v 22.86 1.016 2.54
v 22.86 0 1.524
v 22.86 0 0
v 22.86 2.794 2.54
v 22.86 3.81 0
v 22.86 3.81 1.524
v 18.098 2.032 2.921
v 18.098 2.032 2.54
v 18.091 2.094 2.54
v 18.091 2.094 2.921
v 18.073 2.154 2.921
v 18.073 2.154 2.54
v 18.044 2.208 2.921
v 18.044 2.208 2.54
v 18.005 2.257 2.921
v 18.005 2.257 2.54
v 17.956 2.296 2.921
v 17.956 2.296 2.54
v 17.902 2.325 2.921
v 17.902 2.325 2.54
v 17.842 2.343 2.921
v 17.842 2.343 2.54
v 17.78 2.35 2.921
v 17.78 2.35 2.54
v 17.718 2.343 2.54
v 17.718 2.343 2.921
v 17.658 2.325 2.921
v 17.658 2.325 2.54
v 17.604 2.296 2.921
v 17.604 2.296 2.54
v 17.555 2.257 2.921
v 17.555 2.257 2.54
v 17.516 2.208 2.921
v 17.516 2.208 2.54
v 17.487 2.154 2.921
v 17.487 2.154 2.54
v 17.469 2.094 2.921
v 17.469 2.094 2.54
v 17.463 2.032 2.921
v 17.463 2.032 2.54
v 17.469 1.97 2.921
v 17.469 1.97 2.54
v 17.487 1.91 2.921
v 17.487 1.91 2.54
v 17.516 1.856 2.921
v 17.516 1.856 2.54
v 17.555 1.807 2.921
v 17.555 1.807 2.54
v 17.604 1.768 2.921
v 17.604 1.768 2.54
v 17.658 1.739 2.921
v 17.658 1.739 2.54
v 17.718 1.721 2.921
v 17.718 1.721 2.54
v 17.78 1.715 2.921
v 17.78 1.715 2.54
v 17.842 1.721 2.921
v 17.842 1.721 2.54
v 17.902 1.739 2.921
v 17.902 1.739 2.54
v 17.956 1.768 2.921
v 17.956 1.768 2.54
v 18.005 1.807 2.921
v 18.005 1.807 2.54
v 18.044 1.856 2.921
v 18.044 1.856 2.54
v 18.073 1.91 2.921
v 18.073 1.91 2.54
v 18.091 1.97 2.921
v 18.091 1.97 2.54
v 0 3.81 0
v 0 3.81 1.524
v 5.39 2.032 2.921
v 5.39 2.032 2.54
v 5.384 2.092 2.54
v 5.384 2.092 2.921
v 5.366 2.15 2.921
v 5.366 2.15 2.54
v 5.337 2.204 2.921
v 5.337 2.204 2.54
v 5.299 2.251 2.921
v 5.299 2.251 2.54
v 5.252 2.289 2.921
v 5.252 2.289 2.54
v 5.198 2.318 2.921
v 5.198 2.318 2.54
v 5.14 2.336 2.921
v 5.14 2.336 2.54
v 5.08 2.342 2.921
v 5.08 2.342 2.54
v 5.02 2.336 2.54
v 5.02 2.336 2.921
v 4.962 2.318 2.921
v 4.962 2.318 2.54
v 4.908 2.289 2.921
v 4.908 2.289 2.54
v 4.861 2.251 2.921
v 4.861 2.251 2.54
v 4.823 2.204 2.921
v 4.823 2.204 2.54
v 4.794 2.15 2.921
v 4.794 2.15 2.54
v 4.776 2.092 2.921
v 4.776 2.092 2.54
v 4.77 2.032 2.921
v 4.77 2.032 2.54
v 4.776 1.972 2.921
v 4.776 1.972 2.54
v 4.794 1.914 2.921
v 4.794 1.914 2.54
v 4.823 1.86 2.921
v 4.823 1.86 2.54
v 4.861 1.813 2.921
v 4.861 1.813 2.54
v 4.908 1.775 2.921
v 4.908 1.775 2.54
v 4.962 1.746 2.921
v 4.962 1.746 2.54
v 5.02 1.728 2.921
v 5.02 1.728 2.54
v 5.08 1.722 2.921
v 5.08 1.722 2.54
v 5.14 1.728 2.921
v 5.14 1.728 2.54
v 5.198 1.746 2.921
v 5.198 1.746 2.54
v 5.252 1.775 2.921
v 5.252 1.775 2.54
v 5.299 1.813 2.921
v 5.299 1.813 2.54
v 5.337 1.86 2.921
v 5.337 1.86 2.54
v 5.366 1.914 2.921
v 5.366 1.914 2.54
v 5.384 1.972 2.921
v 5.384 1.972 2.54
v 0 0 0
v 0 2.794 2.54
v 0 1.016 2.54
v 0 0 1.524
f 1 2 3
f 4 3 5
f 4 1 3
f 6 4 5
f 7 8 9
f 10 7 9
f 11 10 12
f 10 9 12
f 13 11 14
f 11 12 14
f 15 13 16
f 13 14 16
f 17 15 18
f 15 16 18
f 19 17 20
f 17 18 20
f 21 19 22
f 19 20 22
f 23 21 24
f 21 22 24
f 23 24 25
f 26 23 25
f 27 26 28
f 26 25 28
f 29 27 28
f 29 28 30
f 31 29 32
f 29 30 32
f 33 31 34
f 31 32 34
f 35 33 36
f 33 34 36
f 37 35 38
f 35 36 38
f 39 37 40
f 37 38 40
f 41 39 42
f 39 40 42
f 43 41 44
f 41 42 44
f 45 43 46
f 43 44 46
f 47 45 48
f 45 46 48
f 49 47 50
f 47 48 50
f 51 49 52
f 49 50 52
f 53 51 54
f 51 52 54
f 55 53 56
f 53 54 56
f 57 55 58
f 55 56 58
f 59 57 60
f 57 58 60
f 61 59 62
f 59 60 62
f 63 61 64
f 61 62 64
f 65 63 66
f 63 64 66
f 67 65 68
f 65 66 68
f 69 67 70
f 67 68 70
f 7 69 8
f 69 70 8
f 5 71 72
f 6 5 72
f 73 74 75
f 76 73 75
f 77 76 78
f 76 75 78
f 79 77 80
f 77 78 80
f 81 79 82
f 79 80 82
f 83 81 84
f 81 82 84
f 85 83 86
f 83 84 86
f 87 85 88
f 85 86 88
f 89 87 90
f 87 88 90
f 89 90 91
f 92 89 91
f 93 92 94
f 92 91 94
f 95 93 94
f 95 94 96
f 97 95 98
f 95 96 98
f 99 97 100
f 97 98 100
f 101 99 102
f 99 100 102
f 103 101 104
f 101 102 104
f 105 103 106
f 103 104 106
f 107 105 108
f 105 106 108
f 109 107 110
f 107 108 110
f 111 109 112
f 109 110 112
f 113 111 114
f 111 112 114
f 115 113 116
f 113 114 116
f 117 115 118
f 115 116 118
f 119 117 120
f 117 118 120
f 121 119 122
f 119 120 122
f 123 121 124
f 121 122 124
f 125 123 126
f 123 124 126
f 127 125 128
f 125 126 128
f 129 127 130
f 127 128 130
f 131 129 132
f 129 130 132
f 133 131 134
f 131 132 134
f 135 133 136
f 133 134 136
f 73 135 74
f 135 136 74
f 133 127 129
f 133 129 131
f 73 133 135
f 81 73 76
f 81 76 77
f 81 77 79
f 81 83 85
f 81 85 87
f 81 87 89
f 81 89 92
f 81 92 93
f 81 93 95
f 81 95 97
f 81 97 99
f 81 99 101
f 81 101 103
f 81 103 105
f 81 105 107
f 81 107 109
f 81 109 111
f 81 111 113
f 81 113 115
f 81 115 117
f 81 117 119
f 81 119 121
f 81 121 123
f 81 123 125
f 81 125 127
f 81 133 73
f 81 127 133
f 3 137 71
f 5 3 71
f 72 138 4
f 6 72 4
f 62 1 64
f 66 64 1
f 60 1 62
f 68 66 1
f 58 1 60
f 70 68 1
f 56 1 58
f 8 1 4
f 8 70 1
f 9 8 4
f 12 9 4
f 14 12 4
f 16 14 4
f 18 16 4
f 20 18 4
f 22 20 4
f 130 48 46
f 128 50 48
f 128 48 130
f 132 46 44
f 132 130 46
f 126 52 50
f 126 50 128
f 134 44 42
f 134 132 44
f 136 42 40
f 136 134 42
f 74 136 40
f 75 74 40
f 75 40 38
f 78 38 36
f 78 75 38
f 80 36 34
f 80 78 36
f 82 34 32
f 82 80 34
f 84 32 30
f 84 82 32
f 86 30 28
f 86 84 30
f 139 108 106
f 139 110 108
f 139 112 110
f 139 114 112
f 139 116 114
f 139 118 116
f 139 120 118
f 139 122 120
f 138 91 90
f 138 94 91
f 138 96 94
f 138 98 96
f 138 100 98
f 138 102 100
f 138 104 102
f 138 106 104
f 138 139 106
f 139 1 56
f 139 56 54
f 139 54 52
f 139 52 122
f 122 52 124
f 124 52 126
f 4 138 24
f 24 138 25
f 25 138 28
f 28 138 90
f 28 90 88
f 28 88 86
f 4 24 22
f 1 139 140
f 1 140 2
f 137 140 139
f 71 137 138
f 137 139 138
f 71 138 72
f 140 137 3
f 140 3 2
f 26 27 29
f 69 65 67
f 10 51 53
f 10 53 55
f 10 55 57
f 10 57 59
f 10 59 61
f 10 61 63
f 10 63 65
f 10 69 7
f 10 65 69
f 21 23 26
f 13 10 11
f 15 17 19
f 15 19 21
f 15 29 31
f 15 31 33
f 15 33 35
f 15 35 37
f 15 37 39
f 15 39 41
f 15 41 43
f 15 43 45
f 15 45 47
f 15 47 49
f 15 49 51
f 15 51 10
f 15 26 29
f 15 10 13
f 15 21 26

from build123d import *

# Parameters (mm, degrees)
F0_W     = 3.81
F0_H     = 2.54
F1_DEPTH = 22.86
F2_SIZE  = 1.016
F3_R     = 0.309594
F3_R_2   = 0.3175
F4_DEPTH = 0.381


with BuildPart() as f1:
    # F0 (on Right) → F1 (new body)
    with BuildSketch(Plane.YZ):
        with Locations((1.905, 1.27)):
            Rectangle(F0_W, F0_H)
    extrude(amount=F1_DEPTH)

    # F2
    f2_edges = [f1.edges().sort_by_distance(p)[0] for p in [
        (11.43, 0, 2.54),
        (11.43, 3.81, 2.54),
    ]]
    chamfer(f2_edges, length=F2_SIZE)

    # F3 (on face) → F4 (join)
    with BuildSketch(Plane.XY.offset(2.54)):
        with Locations((5.08, 2.032)):
            Circle(F3_R)
        with Locations((17.78, 2.032)):
            Circle(F3_R_2)
    extrude(amount=F4_DEPTH)


solid = f1.part
